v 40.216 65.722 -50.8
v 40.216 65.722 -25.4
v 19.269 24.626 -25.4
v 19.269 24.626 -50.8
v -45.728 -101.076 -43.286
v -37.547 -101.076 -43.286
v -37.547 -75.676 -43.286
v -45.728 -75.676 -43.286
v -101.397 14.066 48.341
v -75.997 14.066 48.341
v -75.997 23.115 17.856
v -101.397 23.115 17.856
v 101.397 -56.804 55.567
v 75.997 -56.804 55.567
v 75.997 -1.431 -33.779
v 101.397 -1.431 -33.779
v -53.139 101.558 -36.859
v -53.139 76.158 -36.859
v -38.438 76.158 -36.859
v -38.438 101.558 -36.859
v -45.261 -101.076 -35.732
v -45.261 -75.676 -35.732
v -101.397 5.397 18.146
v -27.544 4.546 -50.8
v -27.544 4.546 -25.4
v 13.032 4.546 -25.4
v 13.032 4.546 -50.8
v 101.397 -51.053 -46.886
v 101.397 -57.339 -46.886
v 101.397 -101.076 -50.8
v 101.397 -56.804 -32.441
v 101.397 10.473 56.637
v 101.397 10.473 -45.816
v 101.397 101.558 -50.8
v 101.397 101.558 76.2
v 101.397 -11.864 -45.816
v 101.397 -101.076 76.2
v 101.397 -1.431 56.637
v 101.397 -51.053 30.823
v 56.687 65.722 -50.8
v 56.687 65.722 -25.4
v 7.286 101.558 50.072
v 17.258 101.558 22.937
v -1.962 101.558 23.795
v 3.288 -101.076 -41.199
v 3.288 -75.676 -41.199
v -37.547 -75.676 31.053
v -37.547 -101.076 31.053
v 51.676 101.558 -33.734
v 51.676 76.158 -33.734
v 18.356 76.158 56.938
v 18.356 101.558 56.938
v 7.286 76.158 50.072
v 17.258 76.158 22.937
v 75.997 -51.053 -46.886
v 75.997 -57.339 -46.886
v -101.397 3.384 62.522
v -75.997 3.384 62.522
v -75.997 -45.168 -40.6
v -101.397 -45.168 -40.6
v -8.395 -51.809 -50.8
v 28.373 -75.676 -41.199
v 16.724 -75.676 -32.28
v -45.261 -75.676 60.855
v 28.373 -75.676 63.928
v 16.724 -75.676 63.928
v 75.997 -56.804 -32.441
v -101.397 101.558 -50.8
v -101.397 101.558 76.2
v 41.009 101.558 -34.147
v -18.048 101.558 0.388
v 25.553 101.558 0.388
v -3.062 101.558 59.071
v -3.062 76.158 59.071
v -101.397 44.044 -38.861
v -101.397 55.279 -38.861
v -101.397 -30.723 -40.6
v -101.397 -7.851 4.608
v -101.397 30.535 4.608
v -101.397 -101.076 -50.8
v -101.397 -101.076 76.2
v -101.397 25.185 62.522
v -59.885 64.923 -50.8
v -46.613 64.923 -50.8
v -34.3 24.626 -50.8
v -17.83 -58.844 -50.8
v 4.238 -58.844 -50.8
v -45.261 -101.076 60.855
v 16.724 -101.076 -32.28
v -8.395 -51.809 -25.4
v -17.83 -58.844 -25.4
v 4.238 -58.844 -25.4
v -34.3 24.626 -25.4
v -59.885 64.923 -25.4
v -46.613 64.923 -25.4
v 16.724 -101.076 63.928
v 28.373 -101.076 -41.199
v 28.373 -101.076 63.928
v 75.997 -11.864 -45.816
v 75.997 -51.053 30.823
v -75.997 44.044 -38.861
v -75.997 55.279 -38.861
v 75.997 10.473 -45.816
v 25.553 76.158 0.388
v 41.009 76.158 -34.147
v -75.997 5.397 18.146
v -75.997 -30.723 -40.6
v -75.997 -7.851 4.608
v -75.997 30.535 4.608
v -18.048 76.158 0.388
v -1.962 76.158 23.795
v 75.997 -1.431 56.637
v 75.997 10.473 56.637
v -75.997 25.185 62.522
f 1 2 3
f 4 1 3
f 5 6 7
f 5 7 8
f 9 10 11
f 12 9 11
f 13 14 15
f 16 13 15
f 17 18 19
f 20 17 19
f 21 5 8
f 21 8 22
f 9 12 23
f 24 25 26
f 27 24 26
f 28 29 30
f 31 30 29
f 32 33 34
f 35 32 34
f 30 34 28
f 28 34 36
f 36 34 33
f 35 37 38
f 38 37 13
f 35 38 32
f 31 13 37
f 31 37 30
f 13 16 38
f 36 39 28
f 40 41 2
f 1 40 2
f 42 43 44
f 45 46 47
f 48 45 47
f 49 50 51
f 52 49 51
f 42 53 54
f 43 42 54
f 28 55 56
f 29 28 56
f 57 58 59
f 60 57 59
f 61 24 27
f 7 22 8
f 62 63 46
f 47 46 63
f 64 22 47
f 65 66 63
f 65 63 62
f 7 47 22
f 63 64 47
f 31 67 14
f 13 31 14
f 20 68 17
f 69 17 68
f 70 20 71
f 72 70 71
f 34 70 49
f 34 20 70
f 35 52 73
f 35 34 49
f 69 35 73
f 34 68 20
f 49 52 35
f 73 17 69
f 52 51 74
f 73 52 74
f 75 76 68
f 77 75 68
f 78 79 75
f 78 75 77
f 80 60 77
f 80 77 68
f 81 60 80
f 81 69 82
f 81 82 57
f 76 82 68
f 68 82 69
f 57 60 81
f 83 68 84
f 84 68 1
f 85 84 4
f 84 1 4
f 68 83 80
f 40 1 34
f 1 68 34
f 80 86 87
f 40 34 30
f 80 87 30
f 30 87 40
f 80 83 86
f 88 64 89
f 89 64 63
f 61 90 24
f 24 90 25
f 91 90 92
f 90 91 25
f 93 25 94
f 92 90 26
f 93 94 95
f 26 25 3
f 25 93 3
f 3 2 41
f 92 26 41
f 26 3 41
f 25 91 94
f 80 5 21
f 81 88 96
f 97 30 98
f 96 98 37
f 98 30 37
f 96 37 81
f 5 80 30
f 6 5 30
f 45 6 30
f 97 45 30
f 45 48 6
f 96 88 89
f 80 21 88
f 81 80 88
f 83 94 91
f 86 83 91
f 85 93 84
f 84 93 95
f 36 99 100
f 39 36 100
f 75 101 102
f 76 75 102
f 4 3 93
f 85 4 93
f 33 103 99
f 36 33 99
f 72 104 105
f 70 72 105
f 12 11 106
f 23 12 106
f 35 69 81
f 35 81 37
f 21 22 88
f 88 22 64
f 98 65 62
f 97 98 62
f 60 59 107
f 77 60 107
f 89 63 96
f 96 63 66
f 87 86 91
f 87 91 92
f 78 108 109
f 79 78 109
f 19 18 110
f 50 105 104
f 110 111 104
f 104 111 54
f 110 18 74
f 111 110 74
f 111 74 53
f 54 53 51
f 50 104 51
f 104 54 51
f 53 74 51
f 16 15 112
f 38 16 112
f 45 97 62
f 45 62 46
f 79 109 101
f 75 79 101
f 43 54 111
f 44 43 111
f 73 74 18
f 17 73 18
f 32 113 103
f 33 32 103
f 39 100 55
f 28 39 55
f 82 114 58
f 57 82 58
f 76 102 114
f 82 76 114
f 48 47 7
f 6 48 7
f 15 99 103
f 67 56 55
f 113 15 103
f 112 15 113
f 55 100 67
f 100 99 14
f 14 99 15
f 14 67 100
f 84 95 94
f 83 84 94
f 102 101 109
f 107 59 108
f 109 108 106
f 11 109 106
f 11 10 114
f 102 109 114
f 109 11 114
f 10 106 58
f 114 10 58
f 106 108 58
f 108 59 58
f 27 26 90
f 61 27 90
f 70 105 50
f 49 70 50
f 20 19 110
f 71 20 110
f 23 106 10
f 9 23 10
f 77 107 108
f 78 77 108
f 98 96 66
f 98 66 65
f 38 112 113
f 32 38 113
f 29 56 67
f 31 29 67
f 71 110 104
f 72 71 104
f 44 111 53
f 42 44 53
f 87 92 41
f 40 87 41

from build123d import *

# Parameters (mm, degrees)
F0_W      = 151.9949287176
F0_H      = 151.8344208598
F1_DEPTH  = 25.4
F2_DEPTH  = 25.4
F3_W      = 151.9949287176
F3_H      = 151.8344208598
F4_DEPTH  = 25.4
F5_DEPTH  = 25.4
F6_W      = 151.9949287176
F6_H      = 151.8344208598
F7_DEPTH  = 25.4
F9_DEPTH  = 25.4
F10_W     = 151.9949287176
F10_H     = 127
F11_DEPTH = 25.4
F12_W     = 151.9949287176
F12_H     = 127
F13_DEPTH = 25.4
F15_DEPTH = 25.4
F16_W     = 202.6344208598
F16_H     = 127
F17_DEPTH = 25.4
F18_W     = 202.6344208598
F18_H     = 127
F19_DEPTH = 25.4
F21_DEPTH = 25.4
F22_DEPTH = 25.4


with BuildPart() as f1:
    # F0 (on Top) → F1 (new body)
    with BuildSketch(Plane.XY):
        with Locations((0, 0.2407543361)):
            Rectangle(F0_W, F0_H)
    extrude(amount=F1_DEPTH)

    # F2 (add): a face of the model
    f2_faces = [f1.faces().sort_by_distance(p)[0] for p in [
        (0, 0.2407543361, 25.4),
    ]]
    extrude(f2_faces, amount=F2_DEPTH)

    # F3 (on face) → F4 (join)
    with BuildSketch(Plane.XY.offset(50.8)):
        with Locations((0, 0.2407543361)):
            Rectangle(F3_W, F3_H)
        Polygon((-54.7822974622, -60.2384917438), (-54.3631203473, -51.7334751785), (-54.3631203473, 43.2750284672), (20.9696162492, -43.1563518941), (29.0977004915, -51.7212189734), (30.7523328811, 43.9543314278), (45.7475273532, 43.6950014908), (45.7475273532, -59.0233169496), (20.4021297395, -59.0233169496), (-46.2220385671, 21.2365556508), (-46.2220385671, -60.2384917438), align=None, mode=Mode.SUBTRACT)
    extrude(amount=F4_DEPTH)

    # F5 (add): a face of the model
    f5_faces = [f1.faces().sort_by_distance(p)[0] for p in [
        (0, 0.2407543361, 0),
    ]]
    extrude(f5_faces, amount=F5_DEPTH)

    # F6 (on face) → F7 (join)
    with BuildSketch(Plane(origin=(0, 0, -25.4), x_dir=(1, 0, 0), z_dir=(0, 0, -1))):
        with Locations((0, -0.2407543361)):
            Rectangle(F6_W, F6_H)
        Polygon((-46.6125570238, -64.9226754904), (-59.8847456276, -64.9226754904), (-17.829503864, 58.8444620371), (4.2375051416, 58.8444620371), (56.6866248846, -65.7222047448), (40.2163229883, -65.7222047448), (19.2686561495, -24.6263965964), (-34.2998057604, -24.6263965964), align=None, mode=Mode.SUBTRACT)
    extrude(amount=F7_DEPTH)

    # F8 (on face) → F9 (join)
    with BuildSketch(Plane(origin=(0, 0, -25.4), x_dir=(1, 0, 0), z_dir=(0, 0, -1))):
        Polygon((13.0323283374, -4.5461022683), (-8.3950581029, 51.8086031079), (-27.544008353, -4.5461022683), align=None)
    extrude(amount=F9_DEPTH)

    # F10 (on face) → F11 (join)
    with BuildSketch(Plane.XZ.offset(75.6764560938)):
        with Locations((0, 12.7)):
            Rectangle(F10_W, F10_H)
        Polygon((-45.7281582057, -43.2857945561), (-45.261003077, -35.732280463), (-45.261003077, 60.8546175063), (16.7235676199, -32.2795137763), (16.7235676199, 63.9280602336), (28.3728465438, 63.9280602336), (28.3728465438, -41.1987639964), (3.2877130434, -41.1987639964), (-37.5465713441, 31.0532525182), (-37.5465713441, -43.2857945561), align=None, mode=Mode.SUBTRACT)
    extrude(amount=F11_DEPTH)

    # F12 (on face) → F13 (join)
    with BuildSketch(Plane(origin=(0, 76.157964766, 0), x_dir=(-1, 0, 0), z_dir=(0, 1, 0))):
        with Locations((0, 12.7)):
            Rectangle(F12_W, F12_H)
        Polygon((-41.00927338, -34.1472737491), (-51.6761131585, -33.7340943515), (-18.3558836579, 56.9384694099), (3.0622561462, 59.0705610812), (53.1387478113, -36.8585251272), (38.4384579957, -36.8585251272), (18.0476587266, 0.3876684059), (-25.5533028394, 0.3876684059), align=None, mode=Mode.SUBTRACT)
    extrude(amount=F13_DEPTH)

    # F14 (on face) → F15 (join)
    with BuildSketch(Plane(origin=(0, 76.157964766, 0), x_dir=(-1, 0, 0), z_dir=(0, 1, 0))):
        Polygon((-7.2864516565, 50.0721470643), (-17.2580555081, 22.9369532317), (1.9618875813, 23.7948019058), align=None)
    extrude(amount=F15_DEPTH)

    # F16 (on face) → F17 (join)
    with BuildSketch(Plane.YZ.offset(75.9974643588)):
        with Locations((0.2407543361, 12.7)):
            Rectangle(F16_W, F16_H)
        Polygon((-57.3391616344, -46.8861833215), (-56.8041577935, -32.4410460889), (-56.8041577935, 55.5672757328), (-1.4311361592, -33.7785594165), (-1.4311361592, 56.6372871399), (10.4727260768, 56.6372871399), (10.4727260768, 55.9685304761), (10.4727260768, -45.8161756396), (-11.8637345731, -45.8161756396), (-51.0528497398, 30.823295936), (-51.0528497398, -46.8861833215), align=None, mode=Mode.SUBTRACT)
    extrude(amount=F17_DEPTH)

    # F18 (on face) → F19 (join)
    with BuildSketch(Plane(origin=(-75.9974643588, 0, 0), x_dir=(0, -1, 0), z_dir=(-1, 0, 0))):
        with Locations((-0.2407543361, 12.7)):
            Rectangle(F18_W, F18_H)
        Polygon((-44.0442897379, -38.8611070812), (-55.2793927491, -38.8611070812), (-25.1853633672, 62.5223442912), (-3.3839091193, 62.5223442912), (45.1677963138, -40.5998714268), (30.7226609439, -40.5998714268), (7.8511973843, 4.6080499887), (-30.5354129523, 4.6080499887), align=None, mode=Mode.SUBTRACT)
    extrude(amount=F19_DEPTH)

    # F20 (on face) → F21 (join)
    with BuildSketch(Plane(origin=(-75.9974643588, 0, 0), x_dir=(0, -1, 0), z_dir=(-1, 0, 0))):
        Polygon((-14.065767224, 48.3413906964), (-23.1149289757, 17.8557671607), (-5.3965207189, 18.1462336332), align=None)
    extrude(amount=F21_DEPTH)

    # F22 (add): a face of the model
    f22_faces = [f1.faces().sort_by_distance(p)[0] for p in [
        (33.0748285463, -57.5754775221, 50.8),
    ]]
    extrude(f22_faces, amount=F22_DEPTH)


solid = f1.part
